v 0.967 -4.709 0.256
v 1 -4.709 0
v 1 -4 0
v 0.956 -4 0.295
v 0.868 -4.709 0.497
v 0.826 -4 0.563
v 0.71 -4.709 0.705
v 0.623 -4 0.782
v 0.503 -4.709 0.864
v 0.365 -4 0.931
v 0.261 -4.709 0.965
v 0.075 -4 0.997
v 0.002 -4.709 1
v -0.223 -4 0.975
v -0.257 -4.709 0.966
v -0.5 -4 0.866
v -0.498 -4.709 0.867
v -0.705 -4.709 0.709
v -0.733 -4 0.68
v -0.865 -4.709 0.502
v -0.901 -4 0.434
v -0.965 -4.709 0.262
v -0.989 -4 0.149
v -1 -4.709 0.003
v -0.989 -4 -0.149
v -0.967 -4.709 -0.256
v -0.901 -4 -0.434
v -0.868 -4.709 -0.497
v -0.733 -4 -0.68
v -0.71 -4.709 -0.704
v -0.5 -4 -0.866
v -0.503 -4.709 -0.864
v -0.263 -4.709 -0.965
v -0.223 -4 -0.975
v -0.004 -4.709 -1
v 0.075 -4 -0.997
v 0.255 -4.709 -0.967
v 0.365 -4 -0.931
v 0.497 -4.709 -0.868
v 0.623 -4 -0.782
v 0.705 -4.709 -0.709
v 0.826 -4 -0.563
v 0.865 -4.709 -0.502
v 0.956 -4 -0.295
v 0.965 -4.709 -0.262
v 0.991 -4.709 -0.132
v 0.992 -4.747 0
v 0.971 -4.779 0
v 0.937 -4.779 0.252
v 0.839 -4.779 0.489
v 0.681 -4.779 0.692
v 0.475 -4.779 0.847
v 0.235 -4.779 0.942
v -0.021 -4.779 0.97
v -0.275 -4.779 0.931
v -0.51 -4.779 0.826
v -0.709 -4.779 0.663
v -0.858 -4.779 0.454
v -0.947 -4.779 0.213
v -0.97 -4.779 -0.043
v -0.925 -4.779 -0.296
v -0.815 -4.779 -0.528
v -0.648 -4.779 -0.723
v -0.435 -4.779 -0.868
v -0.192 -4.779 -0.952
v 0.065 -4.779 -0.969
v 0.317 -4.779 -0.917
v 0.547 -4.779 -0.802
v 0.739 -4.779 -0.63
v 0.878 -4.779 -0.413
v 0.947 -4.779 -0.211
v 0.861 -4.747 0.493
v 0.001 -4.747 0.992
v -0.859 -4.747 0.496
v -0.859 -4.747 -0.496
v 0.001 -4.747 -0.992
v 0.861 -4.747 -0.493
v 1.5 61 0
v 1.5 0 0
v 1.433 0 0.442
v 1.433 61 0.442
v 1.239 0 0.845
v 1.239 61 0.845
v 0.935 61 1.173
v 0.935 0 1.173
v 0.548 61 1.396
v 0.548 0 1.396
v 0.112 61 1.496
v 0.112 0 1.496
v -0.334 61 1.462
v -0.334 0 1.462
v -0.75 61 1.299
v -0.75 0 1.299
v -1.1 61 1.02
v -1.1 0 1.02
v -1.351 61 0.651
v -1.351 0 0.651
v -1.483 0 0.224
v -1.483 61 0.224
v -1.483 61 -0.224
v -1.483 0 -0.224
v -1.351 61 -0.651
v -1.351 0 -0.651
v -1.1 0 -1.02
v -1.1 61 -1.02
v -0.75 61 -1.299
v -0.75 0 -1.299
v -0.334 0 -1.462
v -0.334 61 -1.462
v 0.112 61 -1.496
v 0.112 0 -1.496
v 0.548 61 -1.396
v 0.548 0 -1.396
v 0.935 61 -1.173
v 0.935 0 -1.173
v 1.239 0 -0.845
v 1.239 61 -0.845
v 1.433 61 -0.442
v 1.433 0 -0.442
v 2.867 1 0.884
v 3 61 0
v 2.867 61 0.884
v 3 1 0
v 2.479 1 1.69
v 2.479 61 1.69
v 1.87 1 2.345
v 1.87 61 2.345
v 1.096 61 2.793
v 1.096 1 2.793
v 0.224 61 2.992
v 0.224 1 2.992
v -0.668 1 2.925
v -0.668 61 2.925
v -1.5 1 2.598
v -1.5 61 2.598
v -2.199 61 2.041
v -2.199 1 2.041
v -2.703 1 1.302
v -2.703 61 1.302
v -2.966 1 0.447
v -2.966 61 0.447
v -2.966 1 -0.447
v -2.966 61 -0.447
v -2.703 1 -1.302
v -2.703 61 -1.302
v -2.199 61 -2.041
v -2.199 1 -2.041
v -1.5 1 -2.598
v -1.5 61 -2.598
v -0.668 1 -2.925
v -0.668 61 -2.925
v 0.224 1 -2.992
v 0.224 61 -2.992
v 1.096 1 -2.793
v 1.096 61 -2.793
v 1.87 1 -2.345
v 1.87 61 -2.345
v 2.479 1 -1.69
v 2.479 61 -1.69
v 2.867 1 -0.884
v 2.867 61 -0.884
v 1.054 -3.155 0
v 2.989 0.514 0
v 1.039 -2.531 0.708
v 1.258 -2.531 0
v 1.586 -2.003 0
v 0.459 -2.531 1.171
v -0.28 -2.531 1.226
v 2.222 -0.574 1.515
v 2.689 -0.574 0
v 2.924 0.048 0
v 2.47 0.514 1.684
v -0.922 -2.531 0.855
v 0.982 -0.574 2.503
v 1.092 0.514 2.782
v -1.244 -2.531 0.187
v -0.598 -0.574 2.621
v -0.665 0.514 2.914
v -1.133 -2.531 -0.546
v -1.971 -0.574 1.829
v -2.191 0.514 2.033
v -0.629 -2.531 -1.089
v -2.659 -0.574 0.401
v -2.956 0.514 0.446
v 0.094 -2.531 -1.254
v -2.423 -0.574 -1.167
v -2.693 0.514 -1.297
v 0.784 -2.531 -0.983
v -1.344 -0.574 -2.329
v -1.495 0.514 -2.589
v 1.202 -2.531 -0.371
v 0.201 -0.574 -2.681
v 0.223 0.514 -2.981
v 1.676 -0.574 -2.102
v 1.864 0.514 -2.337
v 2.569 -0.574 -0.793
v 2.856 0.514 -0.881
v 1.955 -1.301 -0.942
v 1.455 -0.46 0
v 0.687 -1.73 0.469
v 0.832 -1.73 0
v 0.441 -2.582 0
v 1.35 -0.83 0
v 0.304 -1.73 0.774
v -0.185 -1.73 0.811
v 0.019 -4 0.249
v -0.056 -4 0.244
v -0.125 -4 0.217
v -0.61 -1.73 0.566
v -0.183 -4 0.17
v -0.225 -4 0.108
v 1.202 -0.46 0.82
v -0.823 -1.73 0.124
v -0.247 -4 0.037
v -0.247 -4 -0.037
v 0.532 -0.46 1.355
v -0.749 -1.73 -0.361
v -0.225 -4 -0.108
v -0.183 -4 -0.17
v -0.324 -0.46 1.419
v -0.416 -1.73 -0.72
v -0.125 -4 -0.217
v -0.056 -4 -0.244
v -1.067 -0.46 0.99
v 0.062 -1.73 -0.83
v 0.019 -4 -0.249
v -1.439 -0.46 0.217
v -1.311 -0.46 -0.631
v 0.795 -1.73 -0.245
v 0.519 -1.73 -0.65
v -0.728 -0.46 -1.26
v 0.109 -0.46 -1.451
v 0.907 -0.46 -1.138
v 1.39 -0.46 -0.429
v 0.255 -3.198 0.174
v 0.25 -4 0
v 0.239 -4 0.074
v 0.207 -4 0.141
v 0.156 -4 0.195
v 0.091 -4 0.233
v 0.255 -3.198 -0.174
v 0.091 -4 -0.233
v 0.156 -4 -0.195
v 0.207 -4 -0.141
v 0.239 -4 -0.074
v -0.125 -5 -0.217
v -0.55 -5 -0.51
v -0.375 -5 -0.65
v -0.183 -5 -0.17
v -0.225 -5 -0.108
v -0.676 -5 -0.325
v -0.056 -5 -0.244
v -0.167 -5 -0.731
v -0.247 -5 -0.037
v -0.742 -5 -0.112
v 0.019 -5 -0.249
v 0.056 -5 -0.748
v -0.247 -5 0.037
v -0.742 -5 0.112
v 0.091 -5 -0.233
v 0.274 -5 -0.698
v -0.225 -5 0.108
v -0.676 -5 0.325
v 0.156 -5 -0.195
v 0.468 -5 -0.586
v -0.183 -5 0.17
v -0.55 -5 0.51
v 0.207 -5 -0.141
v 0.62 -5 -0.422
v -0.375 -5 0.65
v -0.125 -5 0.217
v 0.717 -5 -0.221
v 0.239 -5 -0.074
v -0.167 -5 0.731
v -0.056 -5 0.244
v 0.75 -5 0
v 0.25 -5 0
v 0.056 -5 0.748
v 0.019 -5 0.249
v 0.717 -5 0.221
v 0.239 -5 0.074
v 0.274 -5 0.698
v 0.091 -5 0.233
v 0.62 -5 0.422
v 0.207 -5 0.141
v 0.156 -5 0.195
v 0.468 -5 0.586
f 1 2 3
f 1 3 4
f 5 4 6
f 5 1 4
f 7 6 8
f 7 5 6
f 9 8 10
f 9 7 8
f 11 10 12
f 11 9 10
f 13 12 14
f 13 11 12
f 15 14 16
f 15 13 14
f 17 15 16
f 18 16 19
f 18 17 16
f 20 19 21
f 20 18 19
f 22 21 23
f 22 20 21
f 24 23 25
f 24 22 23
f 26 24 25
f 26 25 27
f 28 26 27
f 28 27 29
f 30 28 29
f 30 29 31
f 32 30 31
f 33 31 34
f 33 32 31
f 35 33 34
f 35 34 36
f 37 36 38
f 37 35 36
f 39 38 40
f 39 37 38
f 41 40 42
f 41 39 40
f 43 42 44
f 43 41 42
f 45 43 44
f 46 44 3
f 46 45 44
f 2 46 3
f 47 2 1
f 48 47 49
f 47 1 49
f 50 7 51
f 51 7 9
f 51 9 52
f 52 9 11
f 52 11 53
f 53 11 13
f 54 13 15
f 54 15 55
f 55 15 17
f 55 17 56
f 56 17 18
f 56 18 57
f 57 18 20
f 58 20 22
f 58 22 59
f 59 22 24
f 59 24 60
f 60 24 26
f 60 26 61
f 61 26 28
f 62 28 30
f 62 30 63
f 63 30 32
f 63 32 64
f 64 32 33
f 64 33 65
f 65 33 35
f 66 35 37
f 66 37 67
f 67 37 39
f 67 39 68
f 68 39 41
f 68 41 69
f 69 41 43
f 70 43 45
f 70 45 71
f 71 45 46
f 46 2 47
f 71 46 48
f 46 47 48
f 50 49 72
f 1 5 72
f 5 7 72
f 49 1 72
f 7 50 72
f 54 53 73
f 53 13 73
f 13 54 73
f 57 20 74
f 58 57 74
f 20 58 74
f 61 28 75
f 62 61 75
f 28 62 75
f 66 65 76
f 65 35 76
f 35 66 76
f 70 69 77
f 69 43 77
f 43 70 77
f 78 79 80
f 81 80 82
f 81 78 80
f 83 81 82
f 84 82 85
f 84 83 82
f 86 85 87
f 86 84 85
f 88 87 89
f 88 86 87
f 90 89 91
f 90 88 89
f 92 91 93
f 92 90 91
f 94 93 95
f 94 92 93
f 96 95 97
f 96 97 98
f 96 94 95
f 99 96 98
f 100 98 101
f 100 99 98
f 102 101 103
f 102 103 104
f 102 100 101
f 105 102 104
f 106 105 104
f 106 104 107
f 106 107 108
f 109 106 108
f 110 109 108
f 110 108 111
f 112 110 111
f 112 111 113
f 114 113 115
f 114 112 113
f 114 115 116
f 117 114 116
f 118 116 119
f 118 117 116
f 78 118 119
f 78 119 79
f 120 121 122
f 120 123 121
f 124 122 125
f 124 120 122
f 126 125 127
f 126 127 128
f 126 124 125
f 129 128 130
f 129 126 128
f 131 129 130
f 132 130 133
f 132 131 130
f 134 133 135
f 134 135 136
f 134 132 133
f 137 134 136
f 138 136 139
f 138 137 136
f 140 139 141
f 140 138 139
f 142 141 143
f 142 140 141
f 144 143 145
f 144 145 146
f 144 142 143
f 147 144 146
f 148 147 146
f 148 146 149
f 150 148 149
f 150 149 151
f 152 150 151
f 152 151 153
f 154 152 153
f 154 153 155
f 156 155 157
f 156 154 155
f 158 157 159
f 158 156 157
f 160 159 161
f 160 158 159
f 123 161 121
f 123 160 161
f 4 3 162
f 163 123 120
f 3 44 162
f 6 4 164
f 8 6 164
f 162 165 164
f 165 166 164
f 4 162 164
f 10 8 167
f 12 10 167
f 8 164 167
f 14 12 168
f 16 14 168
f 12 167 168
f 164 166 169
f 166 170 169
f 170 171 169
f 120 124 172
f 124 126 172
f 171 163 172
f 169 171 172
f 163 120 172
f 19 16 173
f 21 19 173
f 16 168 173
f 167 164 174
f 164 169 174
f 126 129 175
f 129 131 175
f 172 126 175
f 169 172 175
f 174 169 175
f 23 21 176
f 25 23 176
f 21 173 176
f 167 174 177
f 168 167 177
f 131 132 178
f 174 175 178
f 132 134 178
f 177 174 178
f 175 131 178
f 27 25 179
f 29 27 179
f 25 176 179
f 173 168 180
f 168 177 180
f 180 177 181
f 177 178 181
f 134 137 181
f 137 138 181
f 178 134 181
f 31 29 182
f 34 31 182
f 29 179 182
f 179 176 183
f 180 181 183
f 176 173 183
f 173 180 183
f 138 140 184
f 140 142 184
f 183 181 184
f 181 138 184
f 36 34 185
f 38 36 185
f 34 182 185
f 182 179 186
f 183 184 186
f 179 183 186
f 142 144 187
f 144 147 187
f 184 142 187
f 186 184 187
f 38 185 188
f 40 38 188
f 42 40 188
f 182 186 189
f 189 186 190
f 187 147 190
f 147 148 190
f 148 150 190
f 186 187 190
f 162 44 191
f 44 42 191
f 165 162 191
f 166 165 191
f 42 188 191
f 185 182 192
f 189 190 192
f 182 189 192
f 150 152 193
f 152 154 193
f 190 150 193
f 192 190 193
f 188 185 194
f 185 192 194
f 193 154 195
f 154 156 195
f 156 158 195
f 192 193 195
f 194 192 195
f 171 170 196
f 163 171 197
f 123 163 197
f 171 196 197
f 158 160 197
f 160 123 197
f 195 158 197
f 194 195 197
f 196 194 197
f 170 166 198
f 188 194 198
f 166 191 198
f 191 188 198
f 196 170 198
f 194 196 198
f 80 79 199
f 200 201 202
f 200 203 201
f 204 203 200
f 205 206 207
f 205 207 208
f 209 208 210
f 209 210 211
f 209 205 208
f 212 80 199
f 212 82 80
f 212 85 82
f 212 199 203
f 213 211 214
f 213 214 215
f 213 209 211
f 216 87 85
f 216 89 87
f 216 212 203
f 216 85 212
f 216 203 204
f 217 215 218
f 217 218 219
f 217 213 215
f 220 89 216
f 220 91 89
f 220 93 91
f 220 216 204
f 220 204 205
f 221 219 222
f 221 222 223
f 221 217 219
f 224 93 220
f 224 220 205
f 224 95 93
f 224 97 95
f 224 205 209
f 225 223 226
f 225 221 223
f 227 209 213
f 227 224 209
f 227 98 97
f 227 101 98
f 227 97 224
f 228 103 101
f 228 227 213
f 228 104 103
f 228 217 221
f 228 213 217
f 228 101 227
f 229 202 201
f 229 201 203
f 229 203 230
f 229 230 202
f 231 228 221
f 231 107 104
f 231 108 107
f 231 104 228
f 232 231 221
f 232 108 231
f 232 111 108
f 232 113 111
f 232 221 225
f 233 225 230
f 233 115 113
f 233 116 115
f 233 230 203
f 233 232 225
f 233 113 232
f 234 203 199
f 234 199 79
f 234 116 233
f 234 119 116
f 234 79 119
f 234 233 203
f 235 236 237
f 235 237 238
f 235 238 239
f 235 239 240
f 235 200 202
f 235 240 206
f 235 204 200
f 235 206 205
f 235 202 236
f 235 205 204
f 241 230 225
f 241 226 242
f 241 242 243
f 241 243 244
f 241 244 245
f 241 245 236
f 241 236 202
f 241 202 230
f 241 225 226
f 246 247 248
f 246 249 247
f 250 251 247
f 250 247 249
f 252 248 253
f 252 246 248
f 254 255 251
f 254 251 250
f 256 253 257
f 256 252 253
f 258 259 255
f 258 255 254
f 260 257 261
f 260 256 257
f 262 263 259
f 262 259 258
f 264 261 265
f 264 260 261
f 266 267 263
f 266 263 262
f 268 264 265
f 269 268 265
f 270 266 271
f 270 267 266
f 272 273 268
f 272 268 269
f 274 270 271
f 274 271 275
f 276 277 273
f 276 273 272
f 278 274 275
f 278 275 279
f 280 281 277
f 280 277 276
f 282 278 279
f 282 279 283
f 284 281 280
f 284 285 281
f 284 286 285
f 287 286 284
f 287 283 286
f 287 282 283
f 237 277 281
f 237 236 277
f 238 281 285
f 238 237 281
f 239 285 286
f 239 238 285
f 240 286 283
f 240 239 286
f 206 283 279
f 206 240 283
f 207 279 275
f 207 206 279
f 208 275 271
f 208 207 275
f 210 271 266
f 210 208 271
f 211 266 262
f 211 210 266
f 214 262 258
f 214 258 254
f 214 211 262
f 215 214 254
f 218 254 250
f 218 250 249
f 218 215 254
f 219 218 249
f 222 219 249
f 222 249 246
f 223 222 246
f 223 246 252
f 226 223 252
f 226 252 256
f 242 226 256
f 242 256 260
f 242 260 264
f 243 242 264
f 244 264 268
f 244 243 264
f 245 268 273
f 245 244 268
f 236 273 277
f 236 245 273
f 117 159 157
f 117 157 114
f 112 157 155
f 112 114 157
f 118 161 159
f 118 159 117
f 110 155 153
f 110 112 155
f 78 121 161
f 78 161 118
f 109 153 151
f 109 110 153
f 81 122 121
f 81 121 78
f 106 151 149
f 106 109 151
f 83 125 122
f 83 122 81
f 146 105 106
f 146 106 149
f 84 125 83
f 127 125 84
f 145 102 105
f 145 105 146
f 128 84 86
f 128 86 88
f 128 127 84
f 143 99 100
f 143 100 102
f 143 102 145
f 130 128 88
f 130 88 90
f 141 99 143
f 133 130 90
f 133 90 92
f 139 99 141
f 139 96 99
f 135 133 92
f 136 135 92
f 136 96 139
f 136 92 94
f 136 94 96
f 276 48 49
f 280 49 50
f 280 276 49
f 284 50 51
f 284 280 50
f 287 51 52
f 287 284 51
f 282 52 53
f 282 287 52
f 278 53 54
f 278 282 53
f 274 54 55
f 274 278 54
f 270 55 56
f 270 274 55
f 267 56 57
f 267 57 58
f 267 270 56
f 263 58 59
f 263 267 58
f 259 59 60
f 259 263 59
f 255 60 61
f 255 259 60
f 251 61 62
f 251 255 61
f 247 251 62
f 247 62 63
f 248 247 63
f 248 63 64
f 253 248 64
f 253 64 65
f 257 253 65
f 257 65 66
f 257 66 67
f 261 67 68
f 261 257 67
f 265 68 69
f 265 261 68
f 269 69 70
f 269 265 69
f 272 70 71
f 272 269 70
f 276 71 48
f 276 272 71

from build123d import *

# Parameters (mm, degrees)
CHAMFER1_SIZE = 0.25
FILLET1_R     = 0.1


with BuildPart() as part:
    # Sketch1 → Revolve1 (revolve)
    with BuildSketch(Plane.XY):
        with BuildLine():
            Line((1.5, 61), (3, 61))
            Line((3, 61), (3, 1))
            add(Edge.make_bspline(
                [(1, -4), (1, -2.852326224), (1, -1.704652447), (3, -1.295347553), (3, -0.147673776), (3, 1)],
                knots=[0, 0, 0, 0, 0, 0, 1, 1, 1, 1, 1, 1], degree=5))
            Line((1, -4), (1, -5))
            Line((1, -5), (0.25, -5))
            Line((0.25, -5), (0.25, -4))
            add(Edge.make_bspline(
                [(0.25, -4), (0.25, -3.874328316), (0.348, -1.569029575), (1.407157895, -1.561541747), (1.5, -0.081983242), (1.5, 0)],
                knots=[0, 0, 0, 0, 0.05, 0.95, 1, 1, 1, 1], degree=3))
            Line((1.5, 0), (1.5, 61))
        make_face()
    revolve(axis=Axis((0, 0, 0), (0, -1, 0)))

    # Chamfer1
    chamfer1_edges = [part.edges().sort_by_distance(p)[0] for p in [
        (-1, -5, 0),
    ]]
    chamfer(chamfer1_edges, length=CHAMFER1_SIZE)

    # Fillet1
    fillet1_edges = [part.edges().sort_by_distance(p)[0] for p in [
        (-1, -4.75, 0),
    ]]
    fillet(fillet1_edges, radius=FILLET1_R)


solid = part.part
